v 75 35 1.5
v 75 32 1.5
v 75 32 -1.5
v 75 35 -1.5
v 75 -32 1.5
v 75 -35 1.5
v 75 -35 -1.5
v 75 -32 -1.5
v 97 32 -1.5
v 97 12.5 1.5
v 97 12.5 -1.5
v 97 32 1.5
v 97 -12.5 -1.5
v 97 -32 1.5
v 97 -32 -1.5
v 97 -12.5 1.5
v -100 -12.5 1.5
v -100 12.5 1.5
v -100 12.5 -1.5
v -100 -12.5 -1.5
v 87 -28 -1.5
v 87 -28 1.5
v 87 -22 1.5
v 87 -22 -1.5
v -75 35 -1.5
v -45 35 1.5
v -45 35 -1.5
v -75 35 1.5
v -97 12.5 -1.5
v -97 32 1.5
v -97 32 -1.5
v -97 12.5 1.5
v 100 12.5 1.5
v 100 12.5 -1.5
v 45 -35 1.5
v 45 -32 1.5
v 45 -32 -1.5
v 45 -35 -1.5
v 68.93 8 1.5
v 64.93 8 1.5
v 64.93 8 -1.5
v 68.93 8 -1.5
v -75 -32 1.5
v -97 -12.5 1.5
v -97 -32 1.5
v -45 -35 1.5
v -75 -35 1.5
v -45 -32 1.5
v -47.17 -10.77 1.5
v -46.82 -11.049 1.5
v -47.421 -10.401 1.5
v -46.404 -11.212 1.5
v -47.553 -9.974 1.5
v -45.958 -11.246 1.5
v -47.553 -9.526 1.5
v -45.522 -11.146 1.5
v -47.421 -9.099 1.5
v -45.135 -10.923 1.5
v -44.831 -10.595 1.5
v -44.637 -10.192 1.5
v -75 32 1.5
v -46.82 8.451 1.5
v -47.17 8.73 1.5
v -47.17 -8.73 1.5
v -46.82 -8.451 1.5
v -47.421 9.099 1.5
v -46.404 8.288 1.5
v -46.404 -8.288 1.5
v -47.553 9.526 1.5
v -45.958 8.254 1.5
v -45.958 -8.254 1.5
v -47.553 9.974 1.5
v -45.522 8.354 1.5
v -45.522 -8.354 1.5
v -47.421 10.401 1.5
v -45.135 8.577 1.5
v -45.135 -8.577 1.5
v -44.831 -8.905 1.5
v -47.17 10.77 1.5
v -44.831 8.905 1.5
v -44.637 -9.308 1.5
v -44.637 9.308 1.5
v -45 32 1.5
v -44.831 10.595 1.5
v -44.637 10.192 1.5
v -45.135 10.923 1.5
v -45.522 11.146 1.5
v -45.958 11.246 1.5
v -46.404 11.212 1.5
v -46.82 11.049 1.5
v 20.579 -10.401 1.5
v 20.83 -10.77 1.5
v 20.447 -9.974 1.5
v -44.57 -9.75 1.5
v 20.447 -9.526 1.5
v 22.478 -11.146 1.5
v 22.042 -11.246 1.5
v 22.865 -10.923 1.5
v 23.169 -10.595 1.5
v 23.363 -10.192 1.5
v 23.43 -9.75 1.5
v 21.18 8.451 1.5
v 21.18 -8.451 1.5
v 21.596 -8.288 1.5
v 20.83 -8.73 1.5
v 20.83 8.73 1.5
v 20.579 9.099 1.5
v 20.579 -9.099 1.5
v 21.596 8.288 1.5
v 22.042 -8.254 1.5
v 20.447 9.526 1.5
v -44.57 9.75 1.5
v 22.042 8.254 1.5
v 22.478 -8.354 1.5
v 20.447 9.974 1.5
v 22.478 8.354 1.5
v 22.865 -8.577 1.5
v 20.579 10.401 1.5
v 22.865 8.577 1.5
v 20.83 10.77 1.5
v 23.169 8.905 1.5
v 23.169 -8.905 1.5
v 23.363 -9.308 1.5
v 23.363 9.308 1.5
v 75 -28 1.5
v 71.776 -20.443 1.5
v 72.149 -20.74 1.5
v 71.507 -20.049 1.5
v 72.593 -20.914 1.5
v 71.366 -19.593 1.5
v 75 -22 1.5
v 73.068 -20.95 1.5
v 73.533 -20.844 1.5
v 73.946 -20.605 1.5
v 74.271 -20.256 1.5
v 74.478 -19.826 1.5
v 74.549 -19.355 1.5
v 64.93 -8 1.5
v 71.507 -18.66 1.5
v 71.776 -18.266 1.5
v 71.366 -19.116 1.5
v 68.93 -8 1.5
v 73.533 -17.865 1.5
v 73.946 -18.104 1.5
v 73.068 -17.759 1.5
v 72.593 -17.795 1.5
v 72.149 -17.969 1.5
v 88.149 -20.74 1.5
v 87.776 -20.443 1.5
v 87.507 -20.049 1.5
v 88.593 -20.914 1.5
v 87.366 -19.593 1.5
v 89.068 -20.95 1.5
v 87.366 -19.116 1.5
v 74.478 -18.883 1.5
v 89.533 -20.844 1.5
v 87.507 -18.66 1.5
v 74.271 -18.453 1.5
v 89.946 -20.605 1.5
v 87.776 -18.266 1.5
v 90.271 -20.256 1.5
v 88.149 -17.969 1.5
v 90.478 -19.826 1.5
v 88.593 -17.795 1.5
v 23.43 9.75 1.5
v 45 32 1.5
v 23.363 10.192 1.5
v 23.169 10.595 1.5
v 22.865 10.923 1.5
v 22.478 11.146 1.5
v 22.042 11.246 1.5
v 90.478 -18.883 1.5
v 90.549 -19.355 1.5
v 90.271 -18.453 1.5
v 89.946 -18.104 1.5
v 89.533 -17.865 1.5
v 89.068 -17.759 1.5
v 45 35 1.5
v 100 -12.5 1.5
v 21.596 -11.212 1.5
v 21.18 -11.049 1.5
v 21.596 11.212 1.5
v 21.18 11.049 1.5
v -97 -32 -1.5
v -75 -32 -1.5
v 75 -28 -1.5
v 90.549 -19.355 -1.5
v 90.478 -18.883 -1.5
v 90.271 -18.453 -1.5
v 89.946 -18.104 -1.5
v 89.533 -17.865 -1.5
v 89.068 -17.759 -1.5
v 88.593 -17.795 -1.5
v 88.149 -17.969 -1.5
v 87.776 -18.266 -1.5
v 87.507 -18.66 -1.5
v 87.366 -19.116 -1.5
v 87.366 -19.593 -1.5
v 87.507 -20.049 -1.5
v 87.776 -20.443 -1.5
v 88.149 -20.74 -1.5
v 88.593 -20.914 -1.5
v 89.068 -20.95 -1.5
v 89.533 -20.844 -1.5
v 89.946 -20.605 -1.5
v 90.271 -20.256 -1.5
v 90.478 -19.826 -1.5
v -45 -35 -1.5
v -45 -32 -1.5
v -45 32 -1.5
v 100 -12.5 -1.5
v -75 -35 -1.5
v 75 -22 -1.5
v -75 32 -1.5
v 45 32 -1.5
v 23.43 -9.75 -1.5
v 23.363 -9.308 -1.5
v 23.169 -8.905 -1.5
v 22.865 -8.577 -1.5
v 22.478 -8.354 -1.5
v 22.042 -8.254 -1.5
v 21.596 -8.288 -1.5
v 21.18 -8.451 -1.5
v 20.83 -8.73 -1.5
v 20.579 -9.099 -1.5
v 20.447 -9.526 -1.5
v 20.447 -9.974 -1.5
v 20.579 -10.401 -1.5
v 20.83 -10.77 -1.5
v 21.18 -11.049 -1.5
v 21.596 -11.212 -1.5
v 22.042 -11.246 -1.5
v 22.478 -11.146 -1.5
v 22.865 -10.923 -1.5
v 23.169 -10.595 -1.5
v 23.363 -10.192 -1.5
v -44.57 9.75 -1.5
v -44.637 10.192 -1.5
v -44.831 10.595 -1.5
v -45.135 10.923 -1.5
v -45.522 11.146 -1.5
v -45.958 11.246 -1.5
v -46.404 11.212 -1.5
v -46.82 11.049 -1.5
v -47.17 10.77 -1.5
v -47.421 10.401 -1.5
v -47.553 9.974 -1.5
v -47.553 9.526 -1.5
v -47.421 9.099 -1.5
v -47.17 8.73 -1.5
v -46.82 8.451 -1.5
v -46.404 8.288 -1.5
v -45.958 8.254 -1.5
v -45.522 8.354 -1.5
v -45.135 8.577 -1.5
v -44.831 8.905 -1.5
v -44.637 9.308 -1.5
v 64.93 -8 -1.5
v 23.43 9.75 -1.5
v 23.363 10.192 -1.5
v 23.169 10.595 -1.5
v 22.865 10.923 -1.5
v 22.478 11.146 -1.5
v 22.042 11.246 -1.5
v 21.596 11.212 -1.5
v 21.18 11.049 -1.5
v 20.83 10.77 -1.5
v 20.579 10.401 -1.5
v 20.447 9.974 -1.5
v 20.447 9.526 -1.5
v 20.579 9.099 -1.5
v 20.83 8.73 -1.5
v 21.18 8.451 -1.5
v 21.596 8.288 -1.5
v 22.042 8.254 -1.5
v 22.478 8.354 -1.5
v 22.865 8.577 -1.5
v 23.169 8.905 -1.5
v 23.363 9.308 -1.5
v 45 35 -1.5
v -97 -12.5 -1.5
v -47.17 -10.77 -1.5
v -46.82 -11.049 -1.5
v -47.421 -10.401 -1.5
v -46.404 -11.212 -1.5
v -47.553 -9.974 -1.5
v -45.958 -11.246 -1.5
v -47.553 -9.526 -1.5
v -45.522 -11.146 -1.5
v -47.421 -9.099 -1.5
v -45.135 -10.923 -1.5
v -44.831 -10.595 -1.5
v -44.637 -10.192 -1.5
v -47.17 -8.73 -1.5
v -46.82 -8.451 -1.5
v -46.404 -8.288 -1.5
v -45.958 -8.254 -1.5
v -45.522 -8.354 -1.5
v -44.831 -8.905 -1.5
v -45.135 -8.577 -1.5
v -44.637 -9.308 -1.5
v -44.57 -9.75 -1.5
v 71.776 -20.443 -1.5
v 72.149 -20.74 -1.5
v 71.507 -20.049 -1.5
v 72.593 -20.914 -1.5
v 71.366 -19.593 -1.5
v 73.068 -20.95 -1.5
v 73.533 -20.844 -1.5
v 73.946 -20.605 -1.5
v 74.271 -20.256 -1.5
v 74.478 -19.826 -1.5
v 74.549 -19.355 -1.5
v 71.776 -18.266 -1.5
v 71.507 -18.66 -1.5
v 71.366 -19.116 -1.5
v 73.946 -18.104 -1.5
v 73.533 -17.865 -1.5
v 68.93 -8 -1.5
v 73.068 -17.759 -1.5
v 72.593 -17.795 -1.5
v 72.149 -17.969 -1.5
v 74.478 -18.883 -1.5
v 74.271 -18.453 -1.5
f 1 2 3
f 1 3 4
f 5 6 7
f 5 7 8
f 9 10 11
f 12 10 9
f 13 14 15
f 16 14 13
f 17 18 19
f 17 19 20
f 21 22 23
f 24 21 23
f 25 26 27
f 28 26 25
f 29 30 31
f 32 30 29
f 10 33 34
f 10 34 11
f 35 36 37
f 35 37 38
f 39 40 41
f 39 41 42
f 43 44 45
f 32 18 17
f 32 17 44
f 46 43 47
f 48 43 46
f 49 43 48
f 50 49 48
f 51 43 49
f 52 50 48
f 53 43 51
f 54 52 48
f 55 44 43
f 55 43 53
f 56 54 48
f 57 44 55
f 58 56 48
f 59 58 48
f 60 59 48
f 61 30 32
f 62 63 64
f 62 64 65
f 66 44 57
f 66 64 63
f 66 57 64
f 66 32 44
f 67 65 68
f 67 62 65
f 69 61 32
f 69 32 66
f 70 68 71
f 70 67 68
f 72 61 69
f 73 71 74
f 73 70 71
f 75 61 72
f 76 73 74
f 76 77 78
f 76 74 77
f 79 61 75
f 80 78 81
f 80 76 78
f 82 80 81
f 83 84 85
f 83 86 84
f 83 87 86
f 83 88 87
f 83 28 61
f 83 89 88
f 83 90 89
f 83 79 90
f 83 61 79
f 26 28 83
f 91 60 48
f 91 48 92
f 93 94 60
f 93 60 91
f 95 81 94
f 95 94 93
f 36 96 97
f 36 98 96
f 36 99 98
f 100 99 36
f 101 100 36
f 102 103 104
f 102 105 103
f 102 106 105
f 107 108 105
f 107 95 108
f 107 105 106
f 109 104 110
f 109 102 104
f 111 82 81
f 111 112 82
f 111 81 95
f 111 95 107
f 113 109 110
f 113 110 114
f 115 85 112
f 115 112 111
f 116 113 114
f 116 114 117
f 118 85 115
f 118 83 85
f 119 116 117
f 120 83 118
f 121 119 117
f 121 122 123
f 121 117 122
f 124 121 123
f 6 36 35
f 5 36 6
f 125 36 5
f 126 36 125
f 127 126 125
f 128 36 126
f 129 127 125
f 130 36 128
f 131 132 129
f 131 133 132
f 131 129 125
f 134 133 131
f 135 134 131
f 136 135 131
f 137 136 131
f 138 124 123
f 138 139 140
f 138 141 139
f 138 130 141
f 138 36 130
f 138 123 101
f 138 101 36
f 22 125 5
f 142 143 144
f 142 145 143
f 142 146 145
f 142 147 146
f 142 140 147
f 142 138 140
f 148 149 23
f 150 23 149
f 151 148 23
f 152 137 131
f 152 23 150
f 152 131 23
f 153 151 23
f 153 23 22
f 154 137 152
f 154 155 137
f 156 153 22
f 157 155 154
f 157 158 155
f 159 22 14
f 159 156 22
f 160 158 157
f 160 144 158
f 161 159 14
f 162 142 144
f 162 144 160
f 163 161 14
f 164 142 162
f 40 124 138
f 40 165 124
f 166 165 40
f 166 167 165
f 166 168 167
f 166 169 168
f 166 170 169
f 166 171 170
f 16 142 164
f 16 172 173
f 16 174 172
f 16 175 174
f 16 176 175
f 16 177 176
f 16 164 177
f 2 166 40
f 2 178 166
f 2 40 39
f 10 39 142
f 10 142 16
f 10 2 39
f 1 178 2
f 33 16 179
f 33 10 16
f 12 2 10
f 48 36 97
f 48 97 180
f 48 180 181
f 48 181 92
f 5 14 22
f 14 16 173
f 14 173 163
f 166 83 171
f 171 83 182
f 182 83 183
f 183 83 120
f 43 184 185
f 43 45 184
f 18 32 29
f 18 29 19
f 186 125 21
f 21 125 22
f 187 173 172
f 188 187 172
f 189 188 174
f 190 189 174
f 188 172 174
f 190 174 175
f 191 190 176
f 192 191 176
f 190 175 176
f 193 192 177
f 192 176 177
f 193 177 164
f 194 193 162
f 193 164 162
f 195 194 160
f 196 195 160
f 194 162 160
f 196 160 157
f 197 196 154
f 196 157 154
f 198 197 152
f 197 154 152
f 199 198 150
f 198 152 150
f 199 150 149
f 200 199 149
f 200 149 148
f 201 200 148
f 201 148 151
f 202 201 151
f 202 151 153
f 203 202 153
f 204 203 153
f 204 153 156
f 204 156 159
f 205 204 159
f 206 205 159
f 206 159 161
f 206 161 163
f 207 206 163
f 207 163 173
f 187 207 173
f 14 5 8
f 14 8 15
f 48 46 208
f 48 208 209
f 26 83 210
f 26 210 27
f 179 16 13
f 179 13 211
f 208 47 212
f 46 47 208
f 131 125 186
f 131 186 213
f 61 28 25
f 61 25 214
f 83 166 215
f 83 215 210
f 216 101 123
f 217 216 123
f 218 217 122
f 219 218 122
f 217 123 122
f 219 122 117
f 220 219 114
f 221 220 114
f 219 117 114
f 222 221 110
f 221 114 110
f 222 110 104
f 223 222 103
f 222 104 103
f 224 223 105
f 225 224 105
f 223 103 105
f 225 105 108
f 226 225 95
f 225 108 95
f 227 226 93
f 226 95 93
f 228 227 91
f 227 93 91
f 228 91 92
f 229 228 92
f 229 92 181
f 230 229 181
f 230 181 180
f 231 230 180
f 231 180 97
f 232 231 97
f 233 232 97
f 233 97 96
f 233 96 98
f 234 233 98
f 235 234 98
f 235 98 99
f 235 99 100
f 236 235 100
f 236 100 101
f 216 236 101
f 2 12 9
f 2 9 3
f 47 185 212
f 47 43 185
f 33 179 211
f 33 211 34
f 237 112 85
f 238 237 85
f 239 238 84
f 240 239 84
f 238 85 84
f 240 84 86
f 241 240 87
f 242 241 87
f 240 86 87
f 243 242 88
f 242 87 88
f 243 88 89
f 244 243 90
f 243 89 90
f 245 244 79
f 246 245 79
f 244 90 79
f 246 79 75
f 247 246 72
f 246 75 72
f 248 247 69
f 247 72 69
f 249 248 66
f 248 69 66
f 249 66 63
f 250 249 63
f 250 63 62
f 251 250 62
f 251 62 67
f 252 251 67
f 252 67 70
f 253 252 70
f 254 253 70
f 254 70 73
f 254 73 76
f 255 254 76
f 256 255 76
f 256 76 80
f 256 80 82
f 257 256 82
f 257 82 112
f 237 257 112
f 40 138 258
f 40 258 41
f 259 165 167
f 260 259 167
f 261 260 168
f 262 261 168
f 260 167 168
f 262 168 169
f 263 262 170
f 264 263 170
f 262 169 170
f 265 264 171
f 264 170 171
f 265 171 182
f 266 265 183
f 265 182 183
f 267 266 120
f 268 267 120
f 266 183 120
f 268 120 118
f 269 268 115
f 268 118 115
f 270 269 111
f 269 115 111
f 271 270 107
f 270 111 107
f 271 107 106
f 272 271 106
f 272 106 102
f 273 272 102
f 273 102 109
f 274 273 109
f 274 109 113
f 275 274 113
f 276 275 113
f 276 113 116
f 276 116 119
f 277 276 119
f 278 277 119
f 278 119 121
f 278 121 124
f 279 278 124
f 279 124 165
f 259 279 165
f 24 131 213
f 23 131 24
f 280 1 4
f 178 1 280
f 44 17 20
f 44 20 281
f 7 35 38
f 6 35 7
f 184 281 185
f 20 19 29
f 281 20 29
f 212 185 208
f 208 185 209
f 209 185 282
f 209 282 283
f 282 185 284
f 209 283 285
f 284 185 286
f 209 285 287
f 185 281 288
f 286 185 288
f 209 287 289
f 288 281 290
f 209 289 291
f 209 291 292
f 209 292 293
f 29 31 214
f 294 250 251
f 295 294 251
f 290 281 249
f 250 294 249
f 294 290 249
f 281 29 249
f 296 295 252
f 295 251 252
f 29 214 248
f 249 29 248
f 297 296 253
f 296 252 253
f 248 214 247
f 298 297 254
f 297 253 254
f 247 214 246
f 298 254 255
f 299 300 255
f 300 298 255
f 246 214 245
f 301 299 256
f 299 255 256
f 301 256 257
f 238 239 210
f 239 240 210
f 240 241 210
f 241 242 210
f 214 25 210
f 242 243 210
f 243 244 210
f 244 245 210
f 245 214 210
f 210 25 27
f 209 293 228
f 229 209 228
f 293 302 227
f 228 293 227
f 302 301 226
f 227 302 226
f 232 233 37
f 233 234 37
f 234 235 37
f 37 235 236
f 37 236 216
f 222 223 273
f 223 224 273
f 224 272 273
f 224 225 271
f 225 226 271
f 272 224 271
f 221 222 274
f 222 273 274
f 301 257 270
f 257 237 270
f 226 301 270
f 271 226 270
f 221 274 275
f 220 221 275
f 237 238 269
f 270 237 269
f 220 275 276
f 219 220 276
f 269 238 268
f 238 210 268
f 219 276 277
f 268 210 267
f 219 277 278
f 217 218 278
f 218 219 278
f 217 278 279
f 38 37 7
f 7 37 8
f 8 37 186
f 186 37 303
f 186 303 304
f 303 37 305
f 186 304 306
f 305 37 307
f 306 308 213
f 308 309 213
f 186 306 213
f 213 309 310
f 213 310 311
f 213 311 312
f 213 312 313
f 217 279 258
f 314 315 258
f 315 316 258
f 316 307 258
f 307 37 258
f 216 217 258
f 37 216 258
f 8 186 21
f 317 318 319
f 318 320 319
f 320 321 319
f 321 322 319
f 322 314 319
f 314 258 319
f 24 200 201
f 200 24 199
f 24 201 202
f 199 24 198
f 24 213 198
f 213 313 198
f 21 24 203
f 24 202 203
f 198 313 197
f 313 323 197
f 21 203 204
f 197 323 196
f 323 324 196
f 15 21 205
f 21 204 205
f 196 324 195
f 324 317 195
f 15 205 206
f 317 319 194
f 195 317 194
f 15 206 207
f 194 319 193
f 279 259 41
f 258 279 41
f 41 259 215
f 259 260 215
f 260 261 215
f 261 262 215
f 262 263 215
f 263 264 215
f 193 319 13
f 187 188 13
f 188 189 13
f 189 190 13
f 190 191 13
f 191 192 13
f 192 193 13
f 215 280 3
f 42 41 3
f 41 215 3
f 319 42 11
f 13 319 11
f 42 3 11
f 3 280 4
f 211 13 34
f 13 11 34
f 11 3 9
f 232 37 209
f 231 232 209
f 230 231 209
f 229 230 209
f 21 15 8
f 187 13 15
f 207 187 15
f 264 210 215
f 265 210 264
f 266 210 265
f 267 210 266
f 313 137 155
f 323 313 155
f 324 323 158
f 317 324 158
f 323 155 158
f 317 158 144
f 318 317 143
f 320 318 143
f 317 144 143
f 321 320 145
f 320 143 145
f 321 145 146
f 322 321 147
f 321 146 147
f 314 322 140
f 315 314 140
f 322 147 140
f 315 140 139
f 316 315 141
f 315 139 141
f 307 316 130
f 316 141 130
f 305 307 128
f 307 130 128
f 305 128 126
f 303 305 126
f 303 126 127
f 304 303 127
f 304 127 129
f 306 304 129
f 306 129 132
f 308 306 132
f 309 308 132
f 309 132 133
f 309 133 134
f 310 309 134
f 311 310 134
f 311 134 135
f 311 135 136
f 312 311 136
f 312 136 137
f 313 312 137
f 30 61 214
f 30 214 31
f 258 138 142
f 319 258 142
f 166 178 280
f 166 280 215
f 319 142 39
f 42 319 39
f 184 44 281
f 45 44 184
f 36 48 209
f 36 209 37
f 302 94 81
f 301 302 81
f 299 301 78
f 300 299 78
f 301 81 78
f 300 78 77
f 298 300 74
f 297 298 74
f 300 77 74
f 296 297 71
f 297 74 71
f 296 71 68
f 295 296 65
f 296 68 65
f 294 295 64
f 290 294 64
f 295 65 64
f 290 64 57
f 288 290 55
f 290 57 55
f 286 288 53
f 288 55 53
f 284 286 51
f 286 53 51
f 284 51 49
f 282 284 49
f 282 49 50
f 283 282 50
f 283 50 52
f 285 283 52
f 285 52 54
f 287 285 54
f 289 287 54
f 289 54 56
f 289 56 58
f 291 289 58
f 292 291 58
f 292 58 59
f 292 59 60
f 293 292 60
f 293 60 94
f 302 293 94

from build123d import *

# Parameters (mm, degrees)
SALIENTE_EXTRUIR1_DEPTH = 1.5
CROQUIS2_R              = 1.6
CORTAR_EXTRUIR1_DEPTH   = 10
CROQUIS3_W              = 12
CROQUIS3_H              = 6
CORTAR_EXTRUIR2_DEPTH   = 10
CROQUIS4_W              = 4
CROQUIS4_H              = 16
CORTAR_EXTRUIR3_DEPTH   = 10
CORTAR_EXTRUIR4_REACH   = 107.991
CROQUIS5_R              = 1.5


with BuildPart() as part:
    # Croquis1 → Saliente-Extruir1 (new, symmetric)
    with BuildSketch(Plane.XY):
        Polygon((-75, -32), (-75, -35), (-45, -35), (-45, -32), (45, -32), (45, -35), (75, -35), (75, -32), (97, -32), (97, -12.5), (100, -12.5), (100, 12.5), (97, 12.5), (97, 32), (75, 32), (75, 35), (45, 35), (45, 32), (-45, 32), (-45, 35), (-75, 35), (-75, 32), (-97, 32), (-97, 12.5), (-100, 12.5), (-100, -12.5), (-97, -12.5), (-97, -32), align=None)
    extrude(amount=SALIENTE_EXTRUIR1_DEPTH, both=True)

    # Croquis2 → Cortar-Extruir1 (cut)
    with BuildSketch(Plane.XY.offset(1.5)):
        with Locations((72.948592978, -19.354512833)):
            Circle(CROQUIS2_R)
        with Locations((88.948592978, -19.354512833)):
            Circle(CROQUIS2_R)
    extrude(amount=-CORTAR_EXTRUIR1_DEPTH, mode=Mode.SUBTRACT)

    # Croquis3 → Cortar-Extruir2 (cut)
    with BuildSketch(Plane.XY.offset(1.5)):
        with Locations((81, -25)):
            Rectangle(CROQUIS3_W, CROQUIS3_H)
    extrude(amount=-CORTAR_EXTRUIR2_DEPTH, mode=Mode.SUBTRACT)

    # Croquis4 → Cortar-Extruir3 (cut)
    with BuildSketch(Plane.XY.offset(1.5)):
        with Locations((66.93, 0)):
            Rectangle(CROQUIS4_W, CROQUIS4_H)
    extrude(amount=-CORTAR_EXTRUIR3_DEPTH, mode=Mode.SUBTRACT)

    # Croquis5 → Cortar-Extruir4 (cut, up to next)
    with BuildSketch(Plane.XY.offset(1.5), mode=Mode.PRIVATE) as cortar_extruir4_sk1:
        with Locations((21.93, 9.75)):
            Circle(CROQUIS5_R)
    cortar_extruir4_tool1 = extrude(cortar_extruir4_sk1.sketch, amount=-CORTAR_EXTRUIR4_REACH, mode=Mode.PRIVATE) & part.part
    # Croquis5 → Cortar-Extruir4 (cut, up to next)
    with BuildSketch(Plane.XY.offset(1.5), mode=Mode.PRIVATE) as cortar_extruir4_sk2:
        with Locations((21.93, -9.75)):
            Circle(CROQUIS5_R)
    cortar_extruir4_tool2 = extrude(cortar_extruir4_sk2.sketch, amount=-CORTAR_EXTRUIR4_REACH, mode=Mode.PRIVATE) & part.part
    # Croquis5 → Cortar-Extruir4 (cut, up to next)
    with BuildSketch(Plane.XY.offset(1.5), mode=Mode.PRIVATE) as cortar_extruir4_sk3:
        with Locations((-46.07, -9.75)):
            Circle(CROQUIS5_R)
    cortar_extruir4_tool3 = extrude(cortar_extruir4_sk3.sketch, amount=-CORTAR_EXTRUIR4_REACH, mode=Mode.PRIVATE) & part.part
    # Croquis5 → Cortar-Extruir4 (cut, up to next)
    with BuildSketch(Plane.XY.offset(1.5), mode=Mode.PRIVATE) as cortar_extruir4_sk4:
        with Locations((-46.07, 9.75)):
            Circle(CROQUIS5_R)
    cortar_extruir4_tool4 = extrude(cortar_extruir4_sk4.sketch, amount=-CORTAR_EXTRUIR4_REACH, mode=Mode.PRIVATE) & part.part
    add(cortar_extruir4_tool1.solids().sort_by_distance((21.93, 9.75, 1.5))[0], mode=Mode.SUBTRACT)
    add(cortar_extruir4_tool2.solids().sort_by_distance((21.93, -9.75, 1.5))[0], mode=Mode.SUBTRACT)
    add(cortar_extruir4_tool3.solids().sort_by_distance((-46.07, -9.75, 1.5))[0], mode=Mode.SUBTRACT)
    add(cortar_extruir4_tool4.solids().sort_by_distance((-46.07, 9.75, 1.5))[0], mode=Mode.SUBTRACT)


solid = part.part
